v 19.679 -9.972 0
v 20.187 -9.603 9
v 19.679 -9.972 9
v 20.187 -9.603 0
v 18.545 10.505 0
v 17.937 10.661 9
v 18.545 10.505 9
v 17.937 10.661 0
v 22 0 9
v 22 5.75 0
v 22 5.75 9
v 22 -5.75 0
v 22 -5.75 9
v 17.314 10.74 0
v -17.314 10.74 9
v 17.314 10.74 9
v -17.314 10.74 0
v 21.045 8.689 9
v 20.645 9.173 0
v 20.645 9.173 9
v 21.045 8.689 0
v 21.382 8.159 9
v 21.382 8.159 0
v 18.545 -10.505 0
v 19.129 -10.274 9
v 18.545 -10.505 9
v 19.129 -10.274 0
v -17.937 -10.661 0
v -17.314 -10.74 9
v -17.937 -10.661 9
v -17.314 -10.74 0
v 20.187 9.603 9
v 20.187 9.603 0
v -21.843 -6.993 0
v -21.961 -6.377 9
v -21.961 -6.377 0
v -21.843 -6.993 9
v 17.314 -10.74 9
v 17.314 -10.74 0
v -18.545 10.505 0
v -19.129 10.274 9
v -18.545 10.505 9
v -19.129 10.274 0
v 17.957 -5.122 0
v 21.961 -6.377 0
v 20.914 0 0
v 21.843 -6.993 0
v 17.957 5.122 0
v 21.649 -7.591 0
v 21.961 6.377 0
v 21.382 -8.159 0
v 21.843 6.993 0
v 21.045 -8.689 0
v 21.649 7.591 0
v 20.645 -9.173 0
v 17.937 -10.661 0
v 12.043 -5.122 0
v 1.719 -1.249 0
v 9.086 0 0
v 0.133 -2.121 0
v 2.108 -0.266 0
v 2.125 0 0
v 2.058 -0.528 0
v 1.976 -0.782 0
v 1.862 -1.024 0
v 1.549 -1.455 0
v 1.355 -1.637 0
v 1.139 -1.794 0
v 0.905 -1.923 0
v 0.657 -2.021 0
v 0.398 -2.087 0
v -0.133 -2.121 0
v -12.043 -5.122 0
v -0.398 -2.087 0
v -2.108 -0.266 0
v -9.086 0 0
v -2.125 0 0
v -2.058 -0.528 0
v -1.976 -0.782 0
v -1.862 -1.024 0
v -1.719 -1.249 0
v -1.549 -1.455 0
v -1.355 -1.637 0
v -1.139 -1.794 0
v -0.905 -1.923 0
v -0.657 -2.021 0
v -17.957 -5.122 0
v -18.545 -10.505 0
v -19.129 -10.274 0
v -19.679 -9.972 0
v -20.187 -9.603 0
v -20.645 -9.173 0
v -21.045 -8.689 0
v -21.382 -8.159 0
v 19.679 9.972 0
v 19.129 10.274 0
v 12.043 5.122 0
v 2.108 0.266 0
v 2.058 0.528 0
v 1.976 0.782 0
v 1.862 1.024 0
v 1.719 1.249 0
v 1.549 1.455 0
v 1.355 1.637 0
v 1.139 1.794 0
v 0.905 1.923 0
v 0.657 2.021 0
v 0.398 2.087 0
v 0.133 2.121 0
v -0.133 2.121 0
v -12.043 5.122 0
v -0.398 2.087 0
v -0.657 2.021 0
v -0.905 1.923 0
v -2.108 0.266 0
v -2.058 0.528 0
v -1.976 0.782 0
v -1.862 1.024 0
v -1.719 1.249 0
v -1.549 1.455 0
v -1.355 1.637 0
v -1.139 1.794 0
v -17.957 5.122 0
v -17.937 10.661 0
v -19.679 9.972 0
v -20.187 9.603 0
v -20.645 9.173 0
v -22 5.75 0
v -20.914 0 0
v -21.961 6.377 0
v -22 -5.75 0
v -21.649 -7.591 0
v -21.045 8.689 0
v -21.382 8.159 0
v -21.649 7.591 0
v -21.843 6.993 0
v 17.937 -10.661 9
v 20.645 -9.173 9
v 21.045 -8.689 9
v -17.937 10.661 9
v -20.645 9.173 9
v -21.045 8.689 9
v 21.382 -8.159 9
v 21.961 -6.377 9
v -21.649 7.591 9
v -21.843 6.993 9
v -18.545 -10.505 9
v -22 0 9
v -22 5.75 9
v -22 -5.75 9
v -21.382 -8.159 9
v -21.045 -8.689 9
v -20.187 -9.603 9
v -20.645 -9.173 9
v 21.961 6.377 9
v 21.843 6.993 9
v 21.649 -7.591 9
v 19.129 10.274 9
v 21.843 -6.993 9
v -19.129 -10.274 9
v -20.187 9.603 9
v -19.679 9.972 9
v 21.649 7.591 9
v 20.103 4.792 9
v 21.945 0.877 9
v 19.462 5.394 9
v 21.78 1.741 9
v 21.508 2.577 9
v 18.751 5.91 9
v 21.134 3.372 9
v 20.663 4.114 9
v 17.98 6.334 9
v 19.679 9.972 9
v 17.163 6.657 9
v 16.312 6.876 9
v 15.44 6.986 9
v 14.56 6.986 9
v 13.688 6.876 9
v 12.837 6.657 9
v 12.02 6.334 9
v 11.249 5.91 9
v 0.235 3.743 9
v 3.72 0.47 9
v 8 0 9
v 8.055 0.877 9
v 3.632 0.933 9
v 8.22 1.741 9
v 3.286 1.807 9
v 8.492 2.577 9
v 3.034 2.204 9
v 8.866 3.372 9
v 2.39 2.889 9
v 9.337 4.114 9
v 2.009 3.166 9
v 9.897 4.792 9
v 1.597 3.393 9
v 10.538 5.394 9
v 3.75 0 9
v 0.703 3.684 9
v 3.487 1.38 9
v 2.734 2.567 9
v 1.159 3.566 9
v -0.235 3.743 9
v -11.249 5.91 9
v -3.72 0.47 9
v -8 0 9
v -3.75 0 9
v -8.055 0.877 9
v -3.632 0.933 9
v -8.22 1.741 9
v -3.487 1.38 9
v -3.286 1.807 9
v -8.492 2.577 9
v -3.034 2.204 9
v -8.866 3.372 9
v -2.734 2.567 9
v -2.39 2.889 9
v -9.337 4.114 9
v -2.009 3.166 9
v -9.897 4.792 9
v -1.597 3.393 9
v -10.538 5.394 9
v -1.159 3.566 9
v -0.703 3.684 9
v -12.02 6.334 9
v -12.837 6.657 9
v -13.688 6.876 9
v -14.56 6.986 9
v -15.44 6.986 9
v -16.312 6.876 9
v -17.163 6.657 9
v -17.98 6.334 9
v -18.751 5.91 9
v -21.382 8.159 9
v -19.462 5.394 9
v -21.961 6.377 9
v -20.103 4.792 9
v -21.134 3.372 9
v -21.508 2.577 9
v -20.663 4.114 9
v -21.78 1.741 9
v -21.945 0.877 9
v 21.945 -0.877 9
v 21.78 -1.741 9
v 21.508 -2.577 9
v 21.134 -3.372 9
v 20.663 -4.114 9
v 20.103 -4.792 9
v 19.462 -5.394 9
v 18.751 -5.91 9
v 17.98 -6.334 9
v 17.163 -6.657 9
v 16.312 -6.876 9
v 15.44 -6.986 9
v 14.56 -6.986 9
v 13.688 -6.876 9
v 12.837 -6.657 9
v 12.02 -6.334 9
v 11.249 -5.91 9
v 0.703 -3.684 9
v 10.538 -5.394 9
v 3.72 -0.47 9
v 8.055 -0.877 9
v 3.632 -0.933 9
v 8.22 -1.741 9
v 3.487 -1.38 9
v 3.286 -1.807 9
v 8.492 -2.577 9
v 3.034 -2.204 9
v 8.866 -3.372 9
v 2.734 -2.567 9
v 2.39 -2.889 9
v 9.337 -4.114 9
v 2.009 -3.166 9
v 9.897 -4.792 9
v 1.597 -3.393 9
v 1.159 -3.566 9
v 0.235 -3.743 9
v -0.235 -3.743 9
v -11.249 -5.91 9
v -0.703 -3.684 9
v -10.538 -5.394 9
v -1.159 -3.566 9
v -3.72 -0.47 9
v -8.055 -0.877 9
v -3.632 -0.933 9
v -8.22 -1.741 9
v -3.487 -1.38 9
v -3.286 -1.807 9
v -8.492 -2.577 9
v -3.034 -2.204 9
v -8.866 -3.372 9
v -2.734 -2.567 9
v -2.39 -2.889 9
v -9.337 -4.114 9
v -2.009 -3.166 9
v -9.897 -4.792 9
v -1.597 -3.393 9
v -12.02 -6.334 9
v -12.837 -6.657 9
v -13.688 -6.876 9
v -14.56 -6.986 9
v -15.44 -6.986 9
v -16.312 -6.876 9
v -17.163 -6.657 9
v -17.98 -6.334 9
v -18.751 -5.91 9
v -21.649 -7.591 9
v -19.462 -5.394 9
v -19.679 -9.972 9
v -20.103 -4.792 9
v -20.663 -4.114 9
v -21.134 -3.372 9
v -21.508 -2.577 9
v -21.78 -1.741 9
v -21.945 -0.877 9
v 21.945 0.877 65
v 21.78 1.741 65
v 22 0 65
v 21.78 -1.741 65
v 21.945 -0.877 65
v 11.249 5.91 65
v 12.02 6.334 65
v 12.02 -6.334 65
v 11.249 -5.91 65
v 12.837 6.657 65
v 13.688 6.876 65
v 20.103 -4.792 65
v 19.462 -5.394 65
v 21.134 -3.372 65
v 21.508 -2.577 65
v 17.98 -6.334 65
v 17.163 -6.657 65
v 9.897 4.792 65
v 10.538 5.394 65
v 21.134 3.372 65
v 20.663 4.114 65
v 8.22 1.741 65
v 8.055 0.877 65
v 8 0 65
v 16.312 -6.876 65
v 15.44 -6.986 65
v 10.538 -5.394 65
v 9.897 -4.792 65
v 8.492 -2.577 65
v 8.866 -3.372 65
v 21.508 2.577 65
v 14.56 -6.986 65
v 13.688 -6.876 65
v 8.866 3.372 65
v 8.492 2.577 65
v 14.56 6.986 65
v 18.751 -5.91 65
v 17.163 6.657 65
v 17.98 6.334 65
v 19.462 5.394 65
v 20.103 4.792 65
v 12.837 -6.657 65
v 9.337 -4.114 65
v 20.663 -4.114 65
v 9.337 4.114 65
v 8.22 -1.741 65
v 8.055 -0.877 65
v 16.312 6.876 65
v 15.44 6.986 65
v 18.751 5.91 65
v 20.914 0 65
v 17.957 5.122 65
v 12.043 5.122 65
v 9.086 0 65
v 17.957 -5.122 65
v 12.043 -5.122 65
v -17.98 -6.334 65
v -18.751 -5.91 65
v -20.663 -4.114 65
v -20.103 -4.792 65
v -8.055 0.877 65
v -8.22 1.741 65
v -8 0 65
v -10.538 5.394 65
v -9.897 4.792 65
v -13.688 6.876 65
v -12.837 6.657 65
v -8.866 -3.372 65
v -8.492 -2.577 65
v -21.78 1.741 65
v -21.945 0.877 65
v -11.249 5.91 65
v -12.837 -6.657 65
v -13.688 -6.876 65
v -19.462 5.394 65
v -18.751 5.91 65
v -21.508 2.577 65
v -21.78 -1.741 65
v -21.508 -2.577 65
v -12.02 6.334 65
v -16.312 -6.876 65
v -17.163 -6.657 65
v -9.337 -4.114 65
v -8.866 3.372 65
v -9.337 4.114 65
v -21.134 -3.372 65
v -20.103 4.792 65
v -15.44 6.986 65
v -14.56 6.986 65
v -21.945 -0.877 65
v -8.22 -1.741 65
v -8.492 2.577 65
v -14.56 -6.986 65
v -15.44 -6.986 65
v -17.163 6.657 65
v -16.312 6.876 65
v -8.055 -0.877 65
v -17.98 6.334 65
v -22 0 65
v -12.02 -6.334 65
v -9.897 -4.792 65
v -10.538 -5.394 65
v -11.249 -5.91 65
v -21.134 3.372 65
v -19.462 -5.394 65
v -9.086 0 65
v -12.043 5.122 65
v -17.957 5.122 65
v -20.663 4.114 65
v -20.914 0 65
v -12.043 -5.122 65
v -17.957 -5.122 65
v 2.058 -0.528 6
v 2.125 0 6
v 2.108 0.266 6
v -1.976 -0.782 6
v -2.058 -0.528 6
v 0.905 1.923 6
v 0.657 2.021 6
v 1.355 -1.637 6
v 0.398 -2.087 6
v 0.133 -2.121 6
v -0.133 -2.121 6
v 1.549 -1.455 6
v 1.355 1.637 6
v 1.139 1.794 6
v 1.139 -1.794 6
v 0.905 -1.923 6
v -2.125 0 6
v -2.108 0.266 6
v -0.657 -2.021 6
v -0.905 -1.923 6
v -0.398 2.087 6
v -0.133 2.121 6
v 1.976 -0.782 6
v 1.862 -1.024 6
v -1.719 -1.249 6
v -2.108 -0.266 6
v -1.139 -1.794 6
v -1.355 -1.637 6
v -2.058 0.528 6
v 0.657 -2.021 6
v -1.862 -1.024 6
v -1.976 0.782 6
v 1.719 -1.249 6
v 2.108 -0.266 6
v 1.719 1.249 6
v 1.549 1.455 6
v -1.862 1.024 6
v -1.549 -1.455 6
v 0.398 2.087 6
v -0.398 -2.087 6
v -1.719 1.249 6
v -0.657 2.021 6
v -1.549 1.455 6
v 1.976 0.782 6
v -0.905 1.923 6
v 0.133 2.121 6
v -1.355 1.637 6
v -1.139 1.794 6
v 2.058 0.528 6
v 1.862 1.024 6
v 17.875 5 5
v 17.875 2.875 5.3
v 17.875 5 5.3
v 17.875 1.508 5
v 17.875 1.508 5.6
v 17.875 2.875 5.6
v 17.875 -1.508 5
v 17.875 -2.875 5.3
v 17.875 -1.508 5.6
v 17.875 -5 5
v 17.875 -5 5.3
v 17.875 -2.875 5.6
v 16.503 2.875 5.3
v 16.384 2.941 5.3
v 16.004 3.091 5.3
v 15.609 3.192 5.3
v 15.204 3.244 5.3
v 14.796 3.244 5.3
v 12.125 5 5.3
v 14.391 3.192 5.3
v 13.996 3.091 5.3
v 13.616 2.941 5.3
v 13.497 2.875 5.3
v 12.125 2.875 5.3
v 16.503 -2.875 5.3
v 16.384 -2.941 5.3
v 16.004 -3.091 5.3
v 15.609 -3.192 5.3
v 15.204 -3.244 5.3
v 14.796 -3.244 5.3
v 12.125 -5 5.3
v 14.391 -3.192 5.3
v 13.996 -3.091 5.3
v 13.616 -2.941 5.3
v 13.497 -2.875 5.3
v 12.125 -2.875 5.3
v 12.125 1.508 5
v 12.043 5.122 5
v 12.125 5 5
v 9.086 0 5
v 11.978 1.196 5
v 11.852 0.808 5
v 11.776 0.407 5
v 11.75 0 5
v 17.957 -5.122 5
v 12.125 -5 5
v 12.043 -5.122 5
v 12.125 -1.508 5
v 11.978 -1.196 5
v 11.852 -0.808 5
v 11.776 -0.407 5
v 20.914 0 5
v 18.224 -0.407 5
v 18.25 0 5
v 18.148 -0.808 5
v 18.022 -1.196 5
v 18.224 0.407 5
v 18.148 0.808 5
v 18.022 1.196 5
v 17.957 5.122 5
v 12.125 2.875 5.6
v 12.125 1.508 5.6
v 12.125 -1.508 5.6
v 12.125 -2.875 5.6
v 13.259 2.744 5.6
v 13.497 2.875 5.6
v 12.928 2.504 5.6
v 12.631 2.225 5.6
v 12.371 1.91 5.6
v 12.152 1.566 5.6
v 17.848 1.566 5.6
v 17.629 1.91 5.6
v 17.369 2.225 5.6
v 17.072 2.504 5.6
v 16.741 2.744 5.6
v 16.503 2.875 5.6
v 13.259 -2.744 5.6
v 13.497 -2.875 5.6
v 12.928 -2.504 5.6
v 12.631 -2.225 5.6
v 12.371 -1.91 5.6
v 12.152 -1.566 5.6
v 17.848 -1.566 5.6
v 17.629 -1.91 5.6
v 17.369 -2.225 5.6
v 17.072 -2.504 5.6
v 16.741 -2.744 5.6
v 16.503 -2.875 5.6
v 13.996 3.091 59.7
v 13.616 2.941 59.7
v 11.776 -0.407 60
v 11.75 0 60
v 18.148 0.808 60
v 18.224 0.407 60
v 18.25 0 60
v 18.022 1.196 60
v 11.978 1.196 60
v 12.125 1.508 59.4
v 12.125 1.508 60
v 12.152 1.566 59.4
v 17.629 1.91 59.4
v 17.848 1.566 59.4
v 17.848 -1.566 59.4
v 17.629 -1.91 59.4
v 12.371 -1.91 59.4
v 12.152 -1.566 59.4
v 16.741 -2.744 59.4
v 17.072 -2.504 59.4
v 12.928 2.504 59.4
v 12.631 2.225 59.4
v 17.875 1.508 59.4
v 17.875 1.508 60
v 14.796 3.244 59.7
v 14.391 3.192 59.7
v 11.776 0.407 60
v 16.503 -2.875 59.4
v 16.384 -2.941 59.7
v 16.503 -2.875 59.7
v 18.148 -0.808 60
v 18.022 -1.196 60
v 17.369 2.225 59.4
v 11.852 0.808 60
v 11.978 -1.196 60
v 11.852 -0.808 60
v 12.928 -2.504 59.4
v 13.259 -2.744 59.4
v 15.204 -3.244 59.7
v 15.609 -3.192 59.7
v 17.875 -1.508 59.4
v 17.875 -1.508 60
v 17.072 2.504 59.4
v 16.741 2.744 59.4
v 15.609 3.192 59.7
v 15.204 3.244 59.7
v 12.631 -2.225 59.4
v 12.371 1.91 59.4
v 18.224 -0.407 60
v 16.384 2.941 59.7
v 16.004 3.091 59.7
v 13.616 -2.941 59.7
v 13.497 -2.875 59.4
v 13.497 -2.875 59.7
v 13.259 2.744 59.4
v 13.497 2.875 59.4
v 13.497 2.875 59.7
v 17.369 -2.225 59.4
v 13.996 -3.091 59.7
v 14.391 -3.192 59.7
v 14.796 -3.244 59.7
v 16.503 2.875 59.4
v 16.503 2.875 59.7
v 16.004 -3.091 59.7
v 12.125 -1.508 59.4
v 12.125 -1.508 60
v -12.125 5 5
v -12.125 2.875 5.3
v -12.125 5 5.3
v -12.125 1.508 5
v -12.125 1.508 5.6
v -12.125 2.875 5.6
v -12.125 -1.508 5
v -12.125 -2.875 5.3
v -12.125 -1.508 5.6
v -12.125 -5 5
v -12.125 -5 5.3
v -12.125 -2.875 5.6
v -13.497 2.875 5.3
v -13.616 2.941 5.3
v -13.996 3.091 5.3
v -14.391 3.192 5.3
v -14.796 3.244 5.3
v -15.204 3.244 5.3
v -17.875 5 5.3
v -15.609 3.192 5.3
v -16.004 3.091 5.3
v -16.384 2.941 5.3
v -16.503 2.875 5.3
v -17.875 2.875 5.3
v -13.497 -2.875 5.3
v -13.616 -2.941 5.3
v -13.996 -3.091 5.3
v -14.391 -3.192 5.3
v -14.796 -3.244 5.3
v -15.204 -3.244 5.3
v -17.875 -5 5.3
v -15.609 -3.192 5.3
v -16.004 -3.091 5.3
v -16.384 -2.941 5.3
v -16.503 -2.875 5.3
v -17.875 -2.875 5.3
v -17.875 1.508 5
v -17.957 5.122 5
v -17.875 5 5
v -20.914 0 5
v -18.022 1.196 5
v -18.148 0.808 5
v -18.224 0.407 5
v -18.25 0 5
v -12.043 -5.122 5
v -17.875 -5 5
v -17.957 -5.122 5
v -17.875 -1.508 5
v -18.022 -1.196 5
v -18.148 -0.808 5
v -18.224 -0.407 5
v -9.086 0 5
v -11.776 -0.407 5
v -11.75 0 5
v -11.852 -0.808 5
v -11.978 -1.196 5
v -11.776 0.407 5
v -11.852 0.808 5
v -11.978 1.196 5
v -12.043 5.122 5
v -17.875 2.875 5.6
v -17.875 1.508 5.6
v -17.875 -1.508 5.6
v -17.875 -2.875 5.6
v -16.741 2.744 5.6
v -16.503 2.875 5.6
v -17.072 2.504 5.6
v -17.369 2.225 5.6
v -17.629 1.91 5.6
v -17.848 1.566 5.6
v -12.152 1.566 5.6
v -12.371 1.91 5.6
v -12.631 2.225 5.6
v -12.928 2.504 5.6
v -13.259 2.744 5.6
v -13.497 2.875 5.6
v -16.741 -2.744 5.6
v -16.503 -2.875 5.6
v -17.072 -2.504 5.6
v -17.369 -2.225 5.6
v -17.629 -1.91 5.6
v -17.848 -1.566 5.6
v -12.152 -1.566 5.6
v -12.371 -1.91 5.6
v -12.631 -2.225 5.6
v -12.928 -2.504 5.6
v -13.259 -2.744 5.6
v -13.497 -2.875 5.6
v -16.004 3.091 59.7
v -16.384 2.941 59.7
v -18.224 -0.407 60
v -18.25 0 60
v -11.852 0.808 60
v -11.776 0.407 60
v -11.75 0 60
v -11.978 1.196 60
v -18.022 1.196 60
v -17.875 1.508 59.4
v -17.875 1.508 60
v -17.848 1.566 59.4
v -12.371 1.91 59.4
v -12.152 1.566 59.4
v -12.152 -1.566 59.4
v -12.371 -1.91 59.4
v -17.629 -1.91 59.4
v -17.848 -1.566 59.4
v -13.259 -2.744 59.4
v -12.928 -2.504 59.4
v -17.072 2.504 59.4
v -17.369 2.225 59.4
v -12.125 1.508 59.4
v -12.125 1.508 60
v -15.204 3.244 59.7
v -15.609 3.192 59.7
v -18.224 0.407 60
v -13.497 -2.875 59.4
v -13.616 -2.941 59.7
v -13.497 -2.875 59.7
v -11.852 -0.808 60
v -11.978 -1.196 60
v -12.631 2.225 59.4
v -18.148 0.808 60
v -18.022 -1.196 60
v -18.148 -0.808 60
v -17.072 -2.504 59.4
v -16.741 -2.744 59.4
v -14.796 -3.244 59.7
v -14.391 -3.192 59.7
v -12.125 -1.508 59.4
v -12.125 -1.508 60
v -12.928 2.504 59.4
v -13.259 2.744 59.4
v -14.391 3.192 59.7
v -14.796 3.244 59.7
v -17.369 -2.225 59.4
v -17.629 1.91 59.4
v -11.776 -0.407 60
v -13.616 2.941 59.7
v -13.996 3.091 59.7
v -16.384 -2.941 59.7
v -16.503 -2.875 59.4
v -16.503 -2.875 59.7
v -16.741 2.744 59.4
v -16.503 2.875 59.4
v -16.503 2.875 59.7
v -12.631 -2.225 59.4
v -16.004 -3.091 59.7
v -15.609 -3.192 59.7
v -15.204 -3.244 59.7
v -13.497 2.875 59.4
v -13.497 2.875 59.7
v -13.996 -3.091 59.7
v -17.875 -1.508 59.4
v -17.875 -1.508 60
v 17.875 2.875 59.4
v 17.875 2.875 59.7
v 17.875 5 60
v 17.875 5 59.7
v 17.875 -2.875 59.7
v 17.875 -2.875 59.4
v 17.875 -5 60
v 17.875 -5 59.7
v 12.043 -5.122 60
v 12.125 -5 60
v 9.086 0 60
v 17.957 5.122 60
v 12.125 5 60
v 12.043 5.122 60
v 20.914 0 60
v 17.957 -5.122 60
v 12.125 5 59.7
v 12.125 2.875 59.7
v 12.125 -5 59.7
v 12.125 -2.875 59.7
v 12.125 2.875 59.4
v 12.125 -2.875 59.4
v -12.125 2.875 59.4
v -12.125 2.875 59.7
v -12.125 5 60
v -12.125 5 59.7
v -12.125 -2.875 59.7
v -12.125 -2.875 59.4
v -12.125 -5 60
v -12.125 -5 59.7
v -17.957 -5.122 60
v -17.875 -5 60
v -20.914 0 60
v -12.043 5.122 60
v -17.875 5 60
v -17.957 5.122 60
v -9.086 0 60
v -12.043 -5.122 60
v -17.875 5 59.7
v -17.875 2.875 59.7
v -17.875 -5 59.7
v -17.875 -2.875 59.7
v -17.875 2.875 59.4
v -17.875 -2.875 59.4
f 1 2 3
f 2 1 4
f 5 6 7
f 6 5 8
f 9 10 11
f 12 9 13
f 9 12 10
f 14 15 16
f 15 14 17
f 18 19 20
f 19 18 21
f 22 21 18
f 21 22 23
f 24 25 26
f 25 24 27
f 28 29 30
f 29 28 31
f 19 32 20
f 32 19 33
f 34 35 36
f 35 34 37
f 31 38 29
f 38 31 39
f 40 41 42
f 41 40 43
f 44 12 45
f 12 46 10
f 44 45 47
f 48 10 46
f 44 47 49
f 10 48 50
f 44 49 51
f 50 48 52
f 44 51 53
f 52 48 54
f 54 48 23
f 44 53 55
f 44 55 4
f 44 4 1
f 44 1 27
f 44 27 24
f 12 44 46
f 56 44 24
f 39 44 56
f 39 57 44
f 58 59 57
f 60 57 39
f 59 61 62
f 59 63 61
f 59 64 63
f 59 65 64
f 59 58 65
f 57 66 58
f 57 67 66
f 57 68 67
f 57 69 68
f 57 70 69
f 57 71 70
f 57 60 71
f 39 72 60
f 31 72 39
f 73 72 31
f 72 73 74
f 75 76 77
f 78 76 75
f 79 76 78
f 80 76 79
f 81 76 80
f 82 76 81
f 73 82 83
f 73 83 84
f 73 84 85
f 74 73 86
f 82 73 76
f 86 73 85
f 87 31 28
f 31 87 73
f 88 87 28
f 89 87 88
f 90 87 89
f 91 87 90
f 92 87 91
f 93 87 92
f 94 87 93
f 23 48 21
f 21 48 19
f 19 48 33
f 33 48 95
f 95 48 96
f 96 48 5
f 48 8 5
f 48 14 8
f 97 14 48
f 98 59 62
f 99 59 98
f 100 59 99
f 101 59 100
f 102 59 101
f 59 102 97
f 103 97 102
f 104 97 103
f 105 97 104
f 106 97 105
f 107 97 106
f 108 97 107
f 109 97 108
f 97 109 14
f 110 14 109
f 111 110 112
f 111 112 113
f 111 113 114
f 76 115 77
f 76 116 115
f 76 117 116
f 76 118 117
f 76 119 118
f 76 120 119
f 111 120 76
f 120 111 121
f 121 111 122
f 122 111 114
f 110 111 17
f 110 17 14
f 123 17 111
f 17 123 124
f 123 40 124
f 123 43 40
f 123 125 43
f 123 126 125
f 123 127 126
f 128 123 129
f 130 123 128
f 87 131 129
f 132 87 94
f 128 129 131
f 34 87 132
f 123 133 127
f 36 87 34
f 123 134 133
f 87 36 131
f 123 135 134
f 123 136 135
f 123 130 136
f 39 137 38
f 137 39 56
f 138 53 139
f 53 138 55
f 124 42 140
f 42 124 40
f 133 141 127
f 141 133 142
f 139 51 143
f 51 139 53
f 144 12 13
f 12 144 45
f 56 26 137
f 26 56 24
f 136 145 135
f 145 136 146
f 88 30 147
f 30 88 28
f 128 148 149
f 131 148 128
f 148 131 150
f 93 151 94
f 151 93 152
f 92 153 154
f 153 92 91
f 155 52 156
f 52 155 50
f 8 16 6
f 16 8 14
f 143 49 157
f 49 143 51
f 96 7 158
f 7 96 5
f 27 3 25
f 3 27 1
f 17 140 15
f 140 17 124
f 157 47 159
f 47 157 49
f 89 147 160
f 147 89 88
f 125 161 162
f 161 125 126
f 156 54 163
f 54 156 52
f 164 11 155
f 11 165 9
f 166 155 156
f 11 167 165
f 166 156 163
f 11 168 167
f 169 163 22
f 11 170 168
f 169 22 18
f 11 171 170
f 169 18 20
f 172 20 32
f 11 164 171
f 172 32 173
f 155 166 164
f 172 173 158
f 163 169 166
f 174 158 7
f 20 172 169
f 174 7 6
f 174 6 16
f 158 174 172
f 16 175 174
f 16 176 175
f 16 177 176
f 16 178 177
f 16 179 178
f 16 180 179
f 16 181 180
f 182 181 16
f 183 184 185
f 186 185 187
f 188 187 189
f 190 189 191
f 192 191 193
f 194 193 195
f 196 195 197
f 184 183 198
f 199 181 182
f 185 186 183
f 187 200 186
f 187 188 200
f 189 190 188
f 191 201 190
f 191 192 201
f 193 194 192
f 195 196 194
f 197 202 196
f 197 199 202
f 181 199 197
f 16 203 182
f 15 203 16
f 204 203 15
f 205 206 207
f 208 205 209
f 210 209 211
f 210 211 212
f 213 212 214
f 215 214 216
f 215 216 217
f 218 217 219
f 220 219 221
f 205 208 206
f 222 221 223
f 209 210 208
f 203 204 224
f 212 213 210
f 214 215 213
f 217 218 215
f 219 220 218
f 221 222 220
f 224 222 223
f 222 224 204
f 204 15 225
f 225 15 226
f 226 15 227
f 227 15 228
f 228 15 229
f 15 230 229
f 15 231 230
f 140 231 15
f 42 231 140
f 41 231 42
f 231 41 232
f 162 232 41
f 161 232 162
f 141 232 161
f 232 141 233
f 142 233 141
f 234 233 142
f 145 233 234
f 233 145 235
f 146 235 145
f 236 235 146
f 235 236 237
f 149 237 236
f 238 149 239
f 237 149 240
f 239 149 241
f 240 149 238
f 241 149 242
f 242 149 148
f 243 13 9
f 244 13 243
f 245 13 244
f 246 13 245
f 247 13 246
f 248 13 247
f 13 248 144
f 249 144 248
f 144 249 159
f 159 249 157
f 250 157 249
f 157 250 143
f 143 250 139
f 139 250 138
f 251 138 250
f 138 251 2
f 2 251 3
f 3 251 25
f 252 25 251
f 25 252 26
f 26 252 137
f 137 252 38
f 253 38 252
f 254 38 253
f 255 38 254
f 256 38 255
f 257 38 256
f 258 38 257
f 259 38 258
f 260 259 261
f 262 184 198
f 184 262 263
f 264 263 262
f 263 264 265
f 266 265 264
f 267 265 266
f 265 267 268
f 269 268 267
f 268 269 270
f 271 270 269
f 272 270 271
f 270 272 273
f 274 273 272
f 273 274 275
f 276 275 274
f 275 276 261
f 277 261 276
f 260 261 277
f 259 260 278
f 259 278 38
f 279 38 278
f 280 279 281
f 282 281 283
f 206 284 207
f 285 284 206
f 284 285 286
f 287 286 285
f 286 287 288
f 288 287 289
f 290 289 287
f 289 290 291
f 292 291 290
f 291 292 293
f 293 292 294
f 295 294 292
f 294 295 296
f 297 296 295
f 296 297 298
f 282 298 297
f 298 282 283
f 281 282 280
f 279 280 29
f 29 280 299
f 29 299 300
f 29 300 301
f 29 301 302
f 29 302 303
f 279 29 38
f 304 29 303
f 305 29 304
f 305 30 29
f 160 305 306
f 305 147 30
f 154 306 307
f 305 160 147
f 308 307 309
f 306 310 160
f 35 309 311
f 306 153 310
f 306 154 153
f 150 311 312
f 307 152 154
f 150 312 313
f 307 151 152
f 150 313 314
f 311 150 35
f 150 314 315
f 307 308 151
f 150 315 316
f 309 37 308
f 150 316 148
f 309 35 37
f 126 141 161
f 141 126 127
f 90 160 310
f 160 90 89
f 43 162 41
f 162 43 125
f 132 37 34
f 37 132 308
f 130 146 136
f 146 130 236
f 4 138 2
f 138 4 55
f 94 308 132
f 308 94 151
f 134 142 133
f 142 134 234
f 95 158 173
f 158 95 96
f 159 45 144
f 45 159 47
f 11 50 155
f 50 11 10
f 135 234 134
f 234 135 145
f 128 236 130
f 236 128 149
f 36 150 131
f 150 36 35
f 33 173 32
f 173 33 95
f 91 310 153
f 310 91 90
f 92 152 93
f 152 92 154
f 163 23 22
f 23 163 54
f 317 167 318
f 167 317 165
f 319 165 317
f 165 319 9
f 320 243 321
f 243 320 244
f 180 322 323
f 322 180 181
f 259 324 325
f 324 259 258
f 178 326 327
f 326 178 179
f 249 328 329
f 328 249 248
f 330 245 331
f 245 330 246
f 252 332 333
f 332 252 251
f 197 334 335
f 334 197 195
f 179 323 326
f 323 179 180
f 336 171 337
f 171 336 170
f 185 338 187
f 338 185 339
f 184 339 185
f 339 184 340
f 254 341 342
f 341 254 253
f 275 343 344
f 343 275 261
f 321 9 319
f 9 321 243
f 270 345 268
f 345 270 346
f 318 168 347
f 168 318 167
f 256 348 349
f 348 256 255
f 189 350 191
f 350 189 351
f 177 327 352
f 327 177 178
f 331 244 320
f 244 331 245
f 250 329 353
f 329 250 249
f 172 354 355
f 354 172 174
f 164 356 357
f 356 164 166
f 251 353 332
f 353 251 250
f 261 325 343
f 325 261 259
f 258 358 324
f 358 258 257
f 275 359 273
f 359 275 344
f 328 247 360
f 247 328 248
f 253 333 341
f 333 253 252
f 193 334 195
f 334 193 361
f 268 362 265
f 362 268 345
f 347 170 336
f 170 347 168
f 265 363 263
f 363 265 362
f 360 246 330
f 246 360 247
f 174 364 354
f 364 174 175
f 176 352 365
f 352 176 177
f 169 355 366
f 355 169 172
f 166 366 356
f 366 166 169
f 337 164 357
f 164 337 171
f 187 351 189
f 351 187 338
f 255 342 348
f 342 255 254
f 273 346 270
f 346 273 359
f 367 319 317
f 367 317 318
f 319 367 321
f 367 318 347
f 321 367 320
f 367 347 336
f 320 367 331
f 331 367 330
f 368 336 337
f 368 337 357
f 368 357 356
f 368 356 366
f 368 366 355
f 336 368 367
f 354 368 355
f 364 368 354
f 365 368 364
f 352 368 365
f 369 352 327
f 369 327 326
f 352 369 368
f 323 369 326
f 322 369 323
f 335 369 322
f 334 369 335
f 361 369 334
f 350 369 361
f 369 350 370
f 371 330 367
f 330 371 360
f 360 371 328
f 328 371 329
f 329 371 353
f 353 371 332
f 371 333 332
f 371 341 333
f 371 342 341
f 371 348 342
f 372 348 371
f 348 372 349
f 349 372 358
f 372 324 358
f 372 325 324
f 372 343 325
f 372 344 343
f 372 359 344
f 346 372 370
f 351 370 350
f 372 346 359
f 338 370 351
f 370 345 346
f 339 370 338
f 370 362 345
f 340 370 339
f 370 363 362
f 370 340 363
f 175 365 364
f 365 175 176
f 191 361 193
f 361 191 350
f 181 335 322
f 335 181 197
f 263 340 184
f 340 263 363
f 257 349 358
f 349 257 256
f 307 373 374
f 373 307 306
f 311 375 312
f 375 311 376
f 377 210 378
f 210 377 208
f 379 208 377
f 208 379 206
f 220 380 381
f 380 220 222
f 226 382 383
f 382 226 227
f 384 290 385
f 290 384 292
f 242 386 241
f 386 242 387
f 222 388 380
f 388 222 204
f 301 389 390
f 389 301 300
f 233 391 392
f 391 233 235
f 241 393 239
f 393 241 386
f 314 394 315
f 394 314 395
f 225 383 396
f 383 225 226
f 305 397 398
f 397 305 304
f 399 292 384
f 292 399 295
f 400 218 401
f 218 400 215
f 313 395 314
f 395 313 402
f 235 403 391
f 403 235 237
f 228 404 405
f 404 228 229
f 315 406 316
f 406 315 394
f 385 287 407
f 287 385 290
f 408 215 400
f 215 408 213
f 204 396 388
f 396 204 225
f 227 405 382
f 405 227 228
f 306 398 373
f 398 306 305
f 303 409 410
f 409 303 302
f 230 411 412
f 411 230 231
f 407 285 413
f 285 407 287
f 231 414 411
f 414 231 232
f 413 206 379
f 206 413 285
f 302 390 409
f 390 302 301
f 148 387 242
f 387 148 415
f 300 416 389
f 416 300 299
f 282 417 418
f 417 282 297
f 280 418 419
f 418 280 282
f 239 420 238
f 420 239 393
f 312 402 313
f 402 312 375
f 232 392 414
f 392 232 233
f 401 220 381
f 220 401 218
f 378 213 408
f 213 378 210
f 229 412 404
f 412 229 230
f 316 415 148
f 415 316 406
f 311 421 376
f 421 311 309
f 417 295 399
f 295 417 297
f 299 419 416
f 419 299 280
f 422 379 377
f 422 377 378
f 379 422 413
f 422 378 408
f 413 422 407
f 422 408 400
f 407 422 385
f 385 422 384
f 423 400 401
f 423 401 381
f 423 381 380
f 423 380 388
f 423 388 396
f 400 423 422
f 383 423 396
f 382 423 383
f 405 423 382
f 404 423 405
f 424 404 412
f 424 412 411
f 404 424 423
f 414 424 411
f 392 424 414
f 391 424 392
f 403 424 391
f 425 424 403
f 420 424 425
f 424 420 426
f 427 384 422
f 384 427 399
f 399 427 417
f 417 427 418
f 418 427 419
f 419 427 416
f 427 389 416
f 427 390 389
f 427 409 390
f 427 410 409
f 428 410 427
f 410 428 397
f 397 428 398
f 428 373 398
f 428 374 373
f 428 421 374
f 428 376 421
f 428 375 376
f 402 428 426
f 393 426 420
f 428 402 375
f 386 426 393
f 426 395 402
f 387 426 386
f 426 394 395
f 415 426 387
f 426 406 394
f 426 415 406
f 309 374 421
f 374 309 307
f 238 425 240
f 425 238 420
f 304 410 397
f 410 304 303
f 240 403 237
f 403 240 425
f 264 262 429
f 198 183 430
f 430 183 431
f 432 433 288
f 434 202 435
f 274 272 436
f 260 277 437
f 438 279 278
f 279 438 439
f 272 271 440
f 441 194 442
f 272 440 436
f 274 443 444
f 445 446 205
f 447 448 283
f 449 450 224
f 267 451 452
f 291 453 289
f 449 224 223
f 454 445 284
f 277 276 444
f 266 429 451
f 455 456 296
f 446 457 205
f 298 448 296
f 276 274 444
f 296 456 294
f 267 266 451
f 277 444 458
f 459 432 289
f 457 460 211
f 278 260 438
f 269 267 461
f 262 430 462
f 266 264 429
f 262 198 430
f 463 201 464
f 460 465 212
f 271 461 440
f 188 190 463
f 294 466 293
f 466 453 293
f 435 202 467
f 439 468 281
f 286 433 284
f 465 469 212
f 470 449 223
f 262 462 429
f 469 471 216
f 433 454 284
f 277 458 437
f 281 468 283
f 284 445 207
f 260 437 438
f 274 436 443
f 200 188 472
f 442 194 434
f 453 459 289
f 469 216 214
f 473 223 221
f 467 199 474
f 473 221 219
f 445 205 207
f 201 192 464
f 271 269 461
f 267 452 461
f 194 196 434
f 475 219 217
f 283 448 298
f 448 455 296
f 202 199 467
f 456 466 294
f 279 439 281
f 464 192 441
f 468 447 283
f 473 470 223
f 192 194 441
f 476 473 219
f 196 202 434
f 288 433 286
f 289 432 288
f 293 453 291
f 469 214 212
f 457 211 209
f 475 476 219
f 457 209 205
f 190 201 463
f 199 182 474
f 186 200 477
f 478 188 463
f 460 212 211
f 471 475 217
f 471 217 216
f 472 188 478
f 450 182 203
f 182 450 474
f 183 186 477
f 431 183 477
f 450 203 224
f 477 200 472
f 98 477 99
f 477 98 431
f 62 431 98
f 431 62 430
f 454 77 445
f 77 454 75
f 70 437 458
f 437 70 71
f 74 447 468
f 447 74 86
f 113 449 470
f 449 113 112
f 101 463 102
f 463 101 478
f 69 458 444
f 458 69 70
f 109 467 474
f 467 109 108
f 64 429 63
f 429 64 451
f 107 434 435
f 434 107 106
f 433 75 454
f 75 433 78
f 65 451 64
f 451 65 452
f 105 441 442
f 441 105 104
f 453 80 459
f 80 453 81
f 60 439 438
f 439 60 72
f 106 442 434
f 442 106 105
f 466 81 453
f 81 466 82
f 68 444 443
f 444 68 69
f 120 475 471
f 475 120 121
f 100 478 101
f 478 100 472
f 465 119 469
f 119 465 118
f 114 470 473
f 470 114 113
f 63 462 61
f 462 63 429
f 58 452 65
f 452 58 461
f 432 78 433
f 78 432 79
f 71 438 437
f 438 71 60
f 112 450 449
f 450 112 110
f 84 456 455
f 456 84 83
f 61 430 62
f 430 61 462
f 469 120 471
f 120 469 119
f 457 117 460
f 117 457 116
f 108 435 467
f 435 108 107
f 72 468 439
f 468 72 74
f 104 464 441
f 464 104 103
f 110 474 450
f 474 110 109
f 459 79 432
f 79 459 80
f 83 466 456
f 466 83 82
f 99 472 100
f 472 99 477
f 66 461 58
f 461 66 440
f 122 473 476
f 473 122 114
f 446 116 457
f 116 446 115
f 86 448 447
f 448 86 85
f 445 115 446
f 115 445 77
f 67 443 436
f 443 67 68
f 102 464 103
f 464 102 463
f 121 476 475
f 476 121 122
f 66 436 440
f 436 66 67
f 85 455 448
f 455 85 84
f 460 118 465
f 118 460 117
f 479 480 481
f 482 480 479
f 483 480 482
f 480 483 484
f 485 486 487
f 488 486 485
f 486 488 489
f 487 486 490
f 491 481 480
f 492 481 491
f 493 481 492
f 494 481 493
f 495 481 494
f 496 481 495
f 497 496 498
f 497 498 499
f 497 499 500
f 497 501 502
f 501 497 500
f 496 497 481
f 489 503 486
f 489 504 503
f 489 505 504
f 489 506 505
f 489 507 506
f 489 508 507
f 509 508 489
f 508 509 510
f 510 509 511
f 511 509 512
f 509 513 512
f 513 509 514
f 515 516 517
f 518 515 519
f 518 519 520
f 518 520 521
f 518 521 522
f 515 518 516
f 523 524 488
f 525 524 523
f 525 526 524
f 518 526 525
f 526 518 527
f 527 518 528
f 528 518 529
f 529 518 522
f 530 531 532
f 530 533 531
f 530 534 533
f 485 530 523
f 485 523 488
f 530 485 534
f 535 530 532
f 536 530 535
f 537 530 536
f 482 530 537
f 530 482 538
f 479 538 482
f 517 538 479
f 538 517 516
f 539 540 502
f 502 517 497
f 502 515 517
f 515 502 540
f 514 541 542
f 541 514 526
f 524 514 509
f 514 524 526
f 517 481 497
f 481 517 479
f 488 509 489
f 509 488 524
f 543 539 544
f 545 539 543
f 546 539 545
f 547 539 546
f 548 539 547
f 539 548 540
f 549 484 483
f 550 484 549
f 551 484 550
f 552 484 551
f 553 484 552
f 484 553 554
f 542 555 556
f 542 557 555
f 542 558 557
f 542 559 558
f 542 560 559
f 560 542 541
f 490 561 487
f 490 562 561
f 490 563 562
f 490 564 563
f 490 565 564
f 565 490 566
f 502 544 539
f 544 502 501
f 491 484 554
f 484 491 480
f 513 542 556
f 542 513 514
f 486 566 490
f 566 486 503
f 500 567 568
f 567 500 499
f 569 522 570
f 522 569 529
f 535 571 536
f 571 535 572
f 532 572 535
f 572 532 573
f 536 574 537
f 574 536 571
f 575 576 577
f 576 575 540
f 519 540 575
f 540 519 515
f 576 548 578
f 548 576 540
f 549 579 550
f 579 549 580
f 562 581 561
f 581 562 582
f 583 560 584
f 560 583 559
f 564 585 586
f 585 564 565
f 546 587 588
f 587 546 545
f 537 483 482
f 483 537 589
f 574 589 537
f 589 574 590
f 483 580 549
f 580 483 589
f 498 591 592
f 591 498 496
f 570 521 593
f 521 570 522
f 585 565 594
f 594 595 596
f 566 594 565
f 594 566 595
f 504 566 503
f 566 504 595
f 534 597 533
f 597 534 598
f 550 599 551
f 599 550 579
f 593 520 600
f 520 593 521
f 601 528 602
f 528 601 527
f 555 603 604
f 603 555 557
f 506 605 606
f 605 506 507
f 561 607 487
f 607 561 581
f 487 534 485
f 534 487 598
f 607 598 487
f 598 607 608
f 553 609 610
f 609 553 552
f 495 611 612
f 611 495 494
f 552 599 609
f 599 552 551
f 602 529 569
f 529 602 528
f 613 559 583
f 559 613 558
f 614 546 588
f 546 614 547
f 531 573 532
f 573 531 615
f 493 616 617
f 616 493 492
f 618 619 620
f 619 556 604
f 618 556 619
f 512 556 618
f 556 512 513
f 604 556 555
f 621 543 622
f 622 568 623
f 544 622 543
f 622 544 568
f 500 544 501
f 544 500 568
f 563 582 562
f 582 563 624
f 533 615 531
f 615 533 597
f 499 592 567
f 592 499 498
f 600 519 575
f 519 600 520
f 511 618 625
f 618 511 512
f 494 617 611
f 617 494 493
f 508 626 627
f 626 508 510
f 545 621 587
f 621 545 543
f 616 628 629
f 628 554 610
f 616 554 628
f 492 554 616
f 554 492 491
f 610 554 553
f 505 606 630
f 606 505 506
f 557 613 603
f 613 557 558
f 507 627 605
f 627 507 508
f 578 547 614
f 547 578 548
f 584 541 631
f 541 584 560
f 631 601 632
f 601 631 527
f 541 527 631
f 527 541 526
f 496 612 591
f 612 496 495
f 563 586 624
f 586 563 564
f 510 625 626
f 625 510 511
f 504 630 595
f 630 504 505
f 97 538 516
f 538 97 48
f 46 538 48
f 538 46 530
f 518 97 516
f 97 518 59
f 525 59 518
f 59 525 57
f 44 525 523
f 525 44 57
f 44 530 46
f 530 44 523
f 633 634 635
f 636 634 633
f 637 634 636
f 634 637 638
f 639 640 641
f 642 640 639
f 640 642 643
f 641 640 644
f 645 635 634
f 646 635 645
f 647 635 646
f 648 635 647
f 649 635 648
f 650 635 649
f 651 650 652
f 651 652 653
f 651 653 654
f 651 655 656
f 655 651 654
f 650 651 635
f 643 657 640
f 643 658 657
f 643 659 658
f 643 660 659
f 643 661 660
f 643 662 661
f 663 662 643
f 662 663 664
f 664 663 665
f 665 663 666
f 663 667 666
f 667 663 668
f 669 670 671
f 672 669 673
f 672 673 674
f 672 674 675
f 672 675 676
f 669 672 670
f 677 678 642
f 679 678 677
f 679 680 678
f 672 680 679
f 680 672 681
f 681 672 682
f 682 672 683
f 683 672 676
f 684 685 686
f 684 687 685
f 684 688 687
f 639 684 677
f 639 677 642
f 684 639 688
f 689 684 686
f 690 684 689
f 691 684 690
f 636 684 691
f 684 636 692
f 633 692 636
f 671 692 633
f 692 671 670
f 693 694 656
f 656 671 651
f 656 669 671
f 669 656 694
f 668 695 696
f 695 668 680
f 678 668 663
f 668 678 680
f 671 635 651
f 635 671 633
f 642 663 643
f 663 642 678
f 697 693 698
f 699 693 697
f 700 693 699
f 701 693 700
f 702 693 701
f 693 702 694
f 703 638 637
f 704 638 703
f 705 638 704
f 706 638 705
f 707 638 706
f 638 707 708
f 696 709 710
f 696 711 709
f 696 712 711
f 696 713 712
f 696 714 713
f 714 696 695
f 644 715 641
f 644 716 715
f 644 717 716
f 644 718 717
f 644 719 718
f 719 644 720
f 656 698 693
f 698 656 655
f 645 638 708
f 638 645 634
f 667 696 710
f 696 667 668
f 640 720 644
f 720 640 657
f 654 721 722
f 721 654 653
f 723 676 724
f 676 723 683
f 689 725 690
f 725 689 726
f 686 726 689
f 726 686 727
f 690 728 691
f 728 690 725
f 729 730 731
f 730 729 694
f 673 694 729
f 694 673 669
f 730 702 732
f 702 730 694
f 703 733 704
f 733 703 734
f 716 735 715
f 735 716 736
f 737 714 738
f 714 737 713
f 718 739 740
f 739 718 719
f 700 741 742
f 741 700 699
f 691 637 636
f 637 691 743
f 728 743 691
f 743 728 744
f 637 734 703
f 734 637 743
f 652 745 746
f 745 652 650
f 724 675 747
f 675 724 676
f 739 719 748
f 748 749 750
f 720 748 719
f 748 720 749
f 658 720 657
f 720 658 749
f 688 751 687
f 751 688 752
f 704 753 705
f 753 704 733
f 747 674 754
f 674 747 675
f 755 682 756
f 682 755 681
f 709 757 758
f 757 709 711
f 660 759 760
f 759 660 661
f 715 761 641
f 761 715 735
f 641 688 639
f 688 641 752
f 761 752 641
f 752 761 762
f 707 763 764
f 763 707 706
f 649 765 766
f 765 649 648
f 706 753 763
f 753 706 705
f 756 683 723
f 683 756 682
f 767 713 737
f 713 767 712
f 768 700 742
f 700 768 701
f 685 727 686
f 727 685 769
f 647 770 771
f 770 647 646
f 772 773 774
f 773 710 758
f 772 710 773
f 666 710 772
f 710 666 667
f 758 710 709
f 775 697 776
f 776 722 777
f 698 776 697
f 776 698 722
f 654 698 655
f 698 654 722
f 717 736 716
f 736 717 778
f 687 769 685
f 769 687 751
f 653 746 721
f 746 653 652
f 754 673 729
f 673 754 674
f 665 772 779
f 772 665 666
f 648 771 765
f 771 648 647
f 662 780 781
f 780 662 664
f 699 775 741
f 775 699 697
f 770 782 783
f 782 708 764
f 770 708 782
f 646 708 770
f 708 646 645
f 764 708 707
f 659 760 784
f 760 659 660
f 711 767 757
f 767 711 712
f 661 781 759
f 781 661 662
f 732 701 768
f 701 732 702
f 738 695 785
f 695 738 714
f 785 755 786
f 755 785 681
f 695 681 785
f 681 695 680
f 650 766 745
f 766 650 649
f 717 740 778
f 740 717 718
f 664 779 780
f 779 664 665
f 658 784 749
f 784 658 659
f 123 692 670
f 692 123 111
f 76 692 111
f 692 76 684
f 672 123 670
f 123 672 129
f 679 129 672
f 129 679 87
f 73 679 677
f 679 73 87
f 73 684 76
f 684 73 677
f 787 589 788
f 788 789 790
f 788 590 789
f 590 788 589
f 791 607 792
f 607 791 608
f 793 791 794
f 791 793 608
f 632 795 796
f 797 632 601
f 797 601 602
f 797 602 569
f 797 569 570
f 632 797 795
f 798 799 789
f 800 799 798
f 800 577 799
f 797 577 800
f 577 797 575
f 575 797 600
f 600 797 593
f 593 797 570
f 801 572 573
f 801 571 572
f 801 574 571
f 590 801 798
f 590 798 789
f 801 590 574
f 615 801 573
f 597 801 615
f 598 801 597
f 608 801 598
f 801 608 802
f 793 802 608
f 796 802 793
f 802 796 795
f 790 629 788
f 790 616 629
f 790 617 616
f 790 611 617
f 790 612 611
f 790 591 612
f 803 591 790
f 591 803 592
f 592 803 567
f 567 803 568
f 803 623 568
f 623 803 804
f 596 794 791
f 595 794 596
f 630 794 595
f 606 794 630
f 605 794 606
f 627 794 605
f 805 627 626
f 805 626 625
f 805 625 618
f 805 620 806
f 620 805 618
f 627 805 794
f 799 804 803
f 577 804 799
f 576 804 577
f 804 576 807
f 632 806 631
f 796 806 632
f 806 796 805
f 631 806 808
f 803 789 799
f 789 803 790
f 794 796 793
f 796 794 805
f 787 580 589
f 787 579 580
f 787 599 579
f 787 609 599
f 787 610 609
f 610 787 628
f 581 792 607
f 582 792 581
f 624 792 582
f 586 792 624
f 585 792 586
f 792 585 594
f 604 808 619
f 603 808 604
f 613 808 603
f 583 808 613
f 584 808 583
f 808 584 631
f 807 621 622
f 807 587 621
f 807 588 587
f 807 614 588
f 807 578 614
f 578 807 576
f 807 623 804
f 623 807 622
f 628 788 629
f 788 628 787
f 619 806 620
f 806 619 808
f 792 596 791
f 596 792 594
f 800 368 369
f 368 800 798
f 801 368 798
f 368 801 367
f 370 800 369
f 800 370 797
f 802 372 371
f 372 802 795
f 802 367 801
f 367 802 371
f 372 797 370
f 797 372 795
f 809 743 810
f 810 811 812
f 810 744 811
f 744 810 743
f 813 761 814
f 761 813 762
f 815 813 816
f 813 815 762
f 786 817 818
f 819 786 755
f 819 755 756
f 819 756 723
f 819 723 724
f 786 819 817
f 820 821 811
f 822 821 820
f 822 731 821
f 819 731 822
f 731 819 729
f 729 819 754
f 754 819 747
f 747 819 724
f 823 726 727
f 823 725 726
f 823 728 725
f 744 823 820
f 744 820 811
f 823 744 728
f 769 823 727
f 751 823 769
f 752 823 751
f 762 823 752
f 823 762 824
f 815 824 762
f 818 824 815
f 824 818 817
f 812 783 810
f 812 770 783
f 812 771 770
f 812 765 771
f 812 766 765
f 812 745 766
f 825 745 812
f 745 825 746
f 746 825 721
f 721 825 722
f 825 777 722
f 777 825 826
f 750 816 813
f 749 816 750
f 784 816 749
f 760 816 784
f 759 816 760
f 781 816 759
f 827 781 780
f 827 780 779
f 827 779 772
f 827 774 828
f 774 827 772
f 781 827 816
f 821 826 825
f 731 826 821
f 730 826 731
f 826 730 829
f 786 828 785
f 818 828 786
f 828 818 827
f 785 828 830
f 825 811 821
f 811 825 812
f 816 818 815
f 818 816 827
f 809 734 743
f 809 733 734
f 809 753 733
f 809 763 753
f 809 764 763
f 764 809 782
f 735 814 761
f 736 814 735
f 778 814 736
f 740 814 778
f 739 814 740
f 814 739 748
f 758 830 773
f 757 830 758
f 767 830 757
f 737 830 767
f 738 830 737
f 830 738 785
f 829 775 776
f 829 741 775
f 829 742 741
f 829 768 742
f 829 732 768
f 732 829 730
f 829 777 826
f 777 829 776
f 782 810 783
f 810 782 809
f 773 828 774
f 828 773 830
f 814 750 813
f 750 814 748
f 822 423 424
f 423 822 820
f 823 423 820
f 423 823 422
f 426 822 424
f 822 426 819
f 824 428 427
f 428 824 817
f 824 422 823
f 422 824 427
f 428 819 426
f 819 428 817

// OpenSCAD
$fn = 50;


difference() {
	union() {
		hull() {
			translate(v = [-17.0000000000, 5.7500000000, 0]) {
				cylinder(h = 9, r = 5);
			}
			translate(v = [17.0000000000, 5.7500000000, 0]) {
				cylinder(h = 9, r = 5);
			}
			translate(v = [-17.0000000000, -5.7500000000, 0]) {
				cylinder(h = 9, r = 5);
			}
			translate(v = [17.0000000000, -5.7500000000, 0]) {
				cylinder(h = 9, r = 5);
			}
		}
		translate(v = [15.0000000000, 0, 0.0000000000]) {
			cylinder(h = 65, r = 7.0000000000);
		}
		translate(v = [-15.0000000000, 0, 0.0000000000]) {
			cylinder(h = 65, r = 7.0000000000);
		}
		translate(v = [15.0000000000, 0, 59.0000000000]) {
			cylinder(h = 6, r = 7.0000000000);
		}
		translate(v = [-15.0000000000, 0, 59.0000000000]) {
			cylinder(h = 6, r = 7.0000000000);
		}
	}
	union() {
		translate(v = [0, 0, 9]) {
			rotate(a = [0, 0, 0]) {
				difference() {
					union() {
						#translate(v = [0, 0, -60.0000000000]) {
							cylinder(h = 60, r = 2.0000000000);
						}
						#translate(v = [0, 0, -3]) {
							cylinder(h = 3, r1 = 2.1250000000, r2 = 3.7500000000);
						}
						#translate(v = [0, 0, -60.0000000000]) {
							cylinder(h = 60, r = 2.1250000000);
						}
						#translate(v = [0, 0, -60.0000000000]) {
							cylinder(h = 60, r = 2.0000000000);
						}
					}
					union();
				}
			}
		}
		translate(v = [15.0000000000, 0, 0]) {
			rotate(a = [0, 0, 0]) {
				difference() {
					union() {
						#translate(v = [-2.8750000000, -5.0000000000, -0.3000000000]) {
							cube(size = [5.7500000000, 10, 0.3000000000]);
						}
						#translate(v = [-2.8750000000, -2.8750000000, -0.6000000000]) {
							cube(size = [5.7500000000, 5.7500000000, 0.3000000000]);
						}
						#translate(v = [-2.8750000000, -5.0000000000, 5]) {
							cube(size = [5.7500000000, 10, 0.3000000000]);
						}
						#translate(v = [-2.8750000000, -2.8750000000, 5.3000000000]) {
							cube(size = [5.7500000000, 5.7500000000, 0.3000000000]);
						}
						#translate(v = [0, 0, -100.0000000000]) {
							cylinder(h = 200, r = 3.2500000000);
						}
						#linear_extrude(height = 5) {
							polygon(points = [[5.9142500000, 0.0000000000], [2.9571250000, 5.1218907443], [-2.9571250000, 5.1218907443], [-5.9142500000, 0.0000000000], [-2.9571250000, -5.1218907443], [2.9571250000, -5.1218907443]]);
						}
						#translate(v = [-2.8750000000, -5.0000000000, -0.3000000000]) {
							cube(size = [5.7500000000, 10, 0.3000000000]);
						}
						#translate(v = [-2.8750000000, -2.8750000000, -0.6000000000]) {
							cube(size = [5.7500000000, 5.7500000000, 0.3000000000]);
						}
						#translate(v = [-2.8750000000, -5.0000000000, 5]) {
							cube(size = [5.7500000000, 10, 0.3000000000]);
						}
						#translate(v = [-2.8750000000, -2.8750000000, 5.3000000000]) {
							cube(size = [5.7500000000, 5.7500000000, 0.3000000000]);
						}
						#translate(v = [0, 0, -100.0000000000]) {
							cylinder(h = 200, r = 3.2500000000);
						}
						#translate(v = [-2.8750000000, -5.0000000000, -0.3000000000]) {
							cube(size = [5.7500000000, 10, 0.3000000000]);
						}
						#translate(v = [-2.8750000000, -2.8750000000, -0.6000000000]) {
							cube(size = [5.7500000000, 5.7500000000, 0.3000000000]);
						}
						#translate(v = [-2.8750000000, -5.0000000000, 5]) {
							cube(size = [5.7500000000, 10, 0.3000000000]);
						}
						#translate(v = [-2.8750000000, -2.8750000000, 5.3000000000]) {
							cube(size = [5.7500000000, 5.7500000000, 0.3000000000]);
						}
						#translate(v = [0, 0, -100.0000000000]) {
							cylinder(h = 200, r = 3.2500000000);
						}
					}
					union();
				}
			}
		}
		translate(v = [-15.0000000000, 0, 0]) {
			rotate(a = [0, 0, 0]) {
				difference() {
					union() {
						#translate(v = [-2.8750000000, -5.0000000000, -0.3000000000]) {
							cube(size = [5.7500000000, 10, 0.3000000000]);
						}
						#translate(v = [-2.8750000000, -2.8750000000, -0.6000000000]) {
							cube(size = [5.7500000000, 5.7500000000, 0.3000000000]);
						}
						#translate(v = [-2.8750000000, -5.0000000000, 5]) {
							cube(size = [5.7500000000, 10, 0.3000000000]);
						}
						#translate(v = [-2.8750000000, -2.8750000000, 5.3000000000]) {
							cube(size = [5.7500000000, 5.7500000000, 0.3000000000]);
						}
						#translate(v = [0, 0, -100.0000000000]) {
							cylinder(h = 200, r = 3.2500000000);
						}
						#linear_extrude(height = 5) {
							polygon(points = [[5.9142500000, 0.0000000000], [2.9571250000, 5.1218907443], [-2.9571250000, 5.1218907443], [-5.9142500000, 0.0000000000], [-2.9571250000, -5.1218907443], [2.9571250000, -5.1218907443]]);
						}
						#translate(v = [-2.8750000000, -5.0000000000, -0.3000000000]) {
							cube(size = [5.7500000000, 10, 0.3000000000]);
						}
						#translate(v = [-2.8750000000, -2.8750000000, -0.6000000000]) {
							cube(size = [5.7500000000, 5.7500000000, 0.3000000000]);
						}
						#translate(v = [-2.8750000000, -5.0000000000, 5]) {
							cube(size = [5.7500000000, 10, 0.3000000000]);
						}
						#translate(v = [-2.8750000000, -2.8750000000, 5.3000000000]) {
							cube(size = [5.7500000000, 5.7500000000, 0.3000000000]);
						}
						#translate(v = [0, 0, -100.0000000000]) {
							cylinder(h = 200, r = 3.2500000000);
						}
						#translate(v = [-2.8750000000, -5.0000000000, -0.3000000000]) {
							cube(size = [5.7500000000, 10, 0.3000000000]);
						}
						#translate(v = [-2.8750000000, -2.8750000000, -0.6000000000]) {
							cube(size = [5.7500000000, 5.7500000000, 0.3000000000]);
						}
						#translate(v = [-2.8750000000, -5.0000000000, 5]) {
							cube(size = [5.7500000000, 10, 0.3000000000]);
						}
						#translate(v = [-2.8750000000, -2.8750000000, 5.3000000000]) {
							cube(size = [5.7500000000, 5.7500000000, 0.3000000000]);
						}
						#translate(v = [0, 0, -100.0000000000]) {
							cylinder(h = 200, r = 3.2500000000);
						}
					}
					union();
				}
			}
		}
		translate(v = [15.0000000000, 0, 65]) {
			rotate(a = [0, 0, 0]) {
				difference() {
					union() {
						#translate(v = [-2.8750000000, -5.0000000000, -5.3000000000]) {
							cube(size = [5.7500000000, 10, 0.3000000000]);
						}
						#translate(v = [-2.8750000000, -2.8750000000, -5.6000000000]) {
							cube(size = [5.7500000000, 5.7500000000, 0.3000000000]);
						}
						#translate(v = [-2.8750000000, -5.0000000000, 0]) {
							cube(size = [5.7500000000, 10, 0.3000000000]);
						}
						#translate(v = [-2.8750000000, -2.8750000000, 0.3000000000]) {
							cube(size = [5.7500000000, 5.7500000000, 0.3000000000]);
						}
						#translate(v = [0, 0, -100.0000000000]) {
							cylinder(h = 200, r = 3.2500000000);
						}
						translate(v = [0, 0, -5]) {
							#linear_extrude(height = 5) {
								polygon(points = [[5.9142500000, 0.0000000000], [2.9571250000, 5.1218907443], [-2.9571250000, 5.1218907443], [-5.9142500000, 0.0000000000], [-2.9571250000, -5.1218907443], [2.9571250000, -5.1218907443]]);
							}
						}
						#translate(v = [-2.8750000000, -5.0000000000, -5.3000000000]) {
							cube(size = [5.7500000000, 10, 0.3000000000]);
						}
						#translate(v = [-2.8750000000, -2.8750000000, -5.6000000000]) {
							cube(size = [5.7500000000, 5.7500000000, 0.3000000000]);
						}
						#translate(v = [-2.8750000000, -5.0000000000, 0]) {
							cube(size = [5.7500000000, 10, 0.3000000000]);
						}
						#translate(v = [-2.8750000000, -2.8750000000, 0.3000000000]) {
							cube(size = [5.7500000000, 5.7500000000, 0.3000000000]);
						}
						#translate(v = [0, 0, -100.0000000000]) {
							cylinder(h = 200, r = 3.2500000000);
						}
						#translate(v = [-2.8750000000, -5.0000000000, -5.3000000000]) {
							cube(size = [5.7500000000, 10, 0.3000000000]);
						}
						#translate(v = [-2.8750000000, -2.8750000000, -5.6000000000]) {
							cube(size = [5.7500000000, 5.7500000000, 0.3000000000]);
						}
						#translate(v = [-2.8750000000, -5.0000000000, 0]) {
							cube(size = [5.7500000000, 10, 0.3000000000]);
						}
						#translate(v = [-2.8750000000, -2.8750000000, 0.3000000000]) {
							cube(size = [5.7500000000, 5.7500000000, 0.3000000000]);
						}
						#translate(v = [0, 0, -100.0000000000]) {
							cylinder(h = 200, r = 3.2500000000);
						}
					}
					union();
				}
			}
		}
		translate(v = [-15.0000000000, 0, 65]) {
			rotate(a = [0, 0, 0]) {
				difference() {
					union() {
						#translate(v = [-2.8750000000, -5.0000000000, -5.3000000000]) {
							cube(size = [5.7500000000, 10, 0.3000000000]);
						}
						#translate(v = [-2.8750000000, -2.8750000000, -5.6000000000]) {
							cube(size = [5.7500000000, 5.7500000000, 0.3000000000]);
						}
						#translate(v = [-2.8750000000, -5.0000000000, 0]) {
							cube(size = [5.7500000000, 10, 0.3000000000]);
						}
						#translate(v = [-2.8750000000, -2.8750000000, 0.3000000000]) {
							cube(size = [5.7500000000, 5.7500000000, 0.3000000000]);
						}
						#translate(v = [0, 0, -100.0000000000]) {
							cylinder(h = 200, r = 3.2500000000);
						}
						translate(v = [0, 0, -5]) {
							#linear_extrude(height = 5) {
								polygon(points = [[5.9142500000, 0.0000000000], [2.9571250000, 5.1218907443], [-2.9571250000, 5.1218907443], [-5.9142500000, 0.0000000000], [-2.9571250000, -5.1218907443], [2.9571250000, -5.1218907443]]);
							}
						}
						#translate(v = [-2.8750000000, -5.0000000000, -5.3000000000]) {
							cube(size = [5.7500000000, 10, 0.3000000000]);
						}
						#translate(v = [-2.8750000000, -2.8750000000, -5.6000000000]) {
							cube(size = [5.7500000000, 5.7500000000, 0.3000000000]);
						}
						#translate(v = [-2.8750000000, -5.0000000000, 0]) {
							cube(size = [5.7500000000, 10, 0.3000000000]);
						}
						#translate(v = [-2.8750000000, -2.8750000000, 0.3000000000]) {
							cube(size = [5.7500000000, 5.7500000000, 0.3000000000]);
						}
						#translate(v = [0, 0, -100.0000000000]) {
							cylinder(h = 200, r = 3.2500000000);
						}
						#translate(v = [-2.8750000000, -5.0000000000, -5.3000000000]) {
							cube(size = [5.7500000000, 10, 0.3000000000]);
						}
						#translate(v = [-2.8750000000, -2.8750000000, -5.6000000000]) {
							cube(size = [5.7500000000, 5.7500000000, 0.3000000000]);
						}
						#translate(v = [-2.8750000000, -5.0000000000, 0]) {
							cube(size = [5.7500000000, 10, 0.3000000000]);
						}
						#translate(v = [-2.8750000000, -2.8750000000, 0.3000000000]) {
							cube(size = [5.7500000000, 5.7500000000, 0.3000000000]);
						}
						#translate(v = [0, 0, -100.0000000000]) {
							cylinder(h = 200, r = 3.2500000000);
						}
					}
					union();
				}
			}
		}
	}
}
